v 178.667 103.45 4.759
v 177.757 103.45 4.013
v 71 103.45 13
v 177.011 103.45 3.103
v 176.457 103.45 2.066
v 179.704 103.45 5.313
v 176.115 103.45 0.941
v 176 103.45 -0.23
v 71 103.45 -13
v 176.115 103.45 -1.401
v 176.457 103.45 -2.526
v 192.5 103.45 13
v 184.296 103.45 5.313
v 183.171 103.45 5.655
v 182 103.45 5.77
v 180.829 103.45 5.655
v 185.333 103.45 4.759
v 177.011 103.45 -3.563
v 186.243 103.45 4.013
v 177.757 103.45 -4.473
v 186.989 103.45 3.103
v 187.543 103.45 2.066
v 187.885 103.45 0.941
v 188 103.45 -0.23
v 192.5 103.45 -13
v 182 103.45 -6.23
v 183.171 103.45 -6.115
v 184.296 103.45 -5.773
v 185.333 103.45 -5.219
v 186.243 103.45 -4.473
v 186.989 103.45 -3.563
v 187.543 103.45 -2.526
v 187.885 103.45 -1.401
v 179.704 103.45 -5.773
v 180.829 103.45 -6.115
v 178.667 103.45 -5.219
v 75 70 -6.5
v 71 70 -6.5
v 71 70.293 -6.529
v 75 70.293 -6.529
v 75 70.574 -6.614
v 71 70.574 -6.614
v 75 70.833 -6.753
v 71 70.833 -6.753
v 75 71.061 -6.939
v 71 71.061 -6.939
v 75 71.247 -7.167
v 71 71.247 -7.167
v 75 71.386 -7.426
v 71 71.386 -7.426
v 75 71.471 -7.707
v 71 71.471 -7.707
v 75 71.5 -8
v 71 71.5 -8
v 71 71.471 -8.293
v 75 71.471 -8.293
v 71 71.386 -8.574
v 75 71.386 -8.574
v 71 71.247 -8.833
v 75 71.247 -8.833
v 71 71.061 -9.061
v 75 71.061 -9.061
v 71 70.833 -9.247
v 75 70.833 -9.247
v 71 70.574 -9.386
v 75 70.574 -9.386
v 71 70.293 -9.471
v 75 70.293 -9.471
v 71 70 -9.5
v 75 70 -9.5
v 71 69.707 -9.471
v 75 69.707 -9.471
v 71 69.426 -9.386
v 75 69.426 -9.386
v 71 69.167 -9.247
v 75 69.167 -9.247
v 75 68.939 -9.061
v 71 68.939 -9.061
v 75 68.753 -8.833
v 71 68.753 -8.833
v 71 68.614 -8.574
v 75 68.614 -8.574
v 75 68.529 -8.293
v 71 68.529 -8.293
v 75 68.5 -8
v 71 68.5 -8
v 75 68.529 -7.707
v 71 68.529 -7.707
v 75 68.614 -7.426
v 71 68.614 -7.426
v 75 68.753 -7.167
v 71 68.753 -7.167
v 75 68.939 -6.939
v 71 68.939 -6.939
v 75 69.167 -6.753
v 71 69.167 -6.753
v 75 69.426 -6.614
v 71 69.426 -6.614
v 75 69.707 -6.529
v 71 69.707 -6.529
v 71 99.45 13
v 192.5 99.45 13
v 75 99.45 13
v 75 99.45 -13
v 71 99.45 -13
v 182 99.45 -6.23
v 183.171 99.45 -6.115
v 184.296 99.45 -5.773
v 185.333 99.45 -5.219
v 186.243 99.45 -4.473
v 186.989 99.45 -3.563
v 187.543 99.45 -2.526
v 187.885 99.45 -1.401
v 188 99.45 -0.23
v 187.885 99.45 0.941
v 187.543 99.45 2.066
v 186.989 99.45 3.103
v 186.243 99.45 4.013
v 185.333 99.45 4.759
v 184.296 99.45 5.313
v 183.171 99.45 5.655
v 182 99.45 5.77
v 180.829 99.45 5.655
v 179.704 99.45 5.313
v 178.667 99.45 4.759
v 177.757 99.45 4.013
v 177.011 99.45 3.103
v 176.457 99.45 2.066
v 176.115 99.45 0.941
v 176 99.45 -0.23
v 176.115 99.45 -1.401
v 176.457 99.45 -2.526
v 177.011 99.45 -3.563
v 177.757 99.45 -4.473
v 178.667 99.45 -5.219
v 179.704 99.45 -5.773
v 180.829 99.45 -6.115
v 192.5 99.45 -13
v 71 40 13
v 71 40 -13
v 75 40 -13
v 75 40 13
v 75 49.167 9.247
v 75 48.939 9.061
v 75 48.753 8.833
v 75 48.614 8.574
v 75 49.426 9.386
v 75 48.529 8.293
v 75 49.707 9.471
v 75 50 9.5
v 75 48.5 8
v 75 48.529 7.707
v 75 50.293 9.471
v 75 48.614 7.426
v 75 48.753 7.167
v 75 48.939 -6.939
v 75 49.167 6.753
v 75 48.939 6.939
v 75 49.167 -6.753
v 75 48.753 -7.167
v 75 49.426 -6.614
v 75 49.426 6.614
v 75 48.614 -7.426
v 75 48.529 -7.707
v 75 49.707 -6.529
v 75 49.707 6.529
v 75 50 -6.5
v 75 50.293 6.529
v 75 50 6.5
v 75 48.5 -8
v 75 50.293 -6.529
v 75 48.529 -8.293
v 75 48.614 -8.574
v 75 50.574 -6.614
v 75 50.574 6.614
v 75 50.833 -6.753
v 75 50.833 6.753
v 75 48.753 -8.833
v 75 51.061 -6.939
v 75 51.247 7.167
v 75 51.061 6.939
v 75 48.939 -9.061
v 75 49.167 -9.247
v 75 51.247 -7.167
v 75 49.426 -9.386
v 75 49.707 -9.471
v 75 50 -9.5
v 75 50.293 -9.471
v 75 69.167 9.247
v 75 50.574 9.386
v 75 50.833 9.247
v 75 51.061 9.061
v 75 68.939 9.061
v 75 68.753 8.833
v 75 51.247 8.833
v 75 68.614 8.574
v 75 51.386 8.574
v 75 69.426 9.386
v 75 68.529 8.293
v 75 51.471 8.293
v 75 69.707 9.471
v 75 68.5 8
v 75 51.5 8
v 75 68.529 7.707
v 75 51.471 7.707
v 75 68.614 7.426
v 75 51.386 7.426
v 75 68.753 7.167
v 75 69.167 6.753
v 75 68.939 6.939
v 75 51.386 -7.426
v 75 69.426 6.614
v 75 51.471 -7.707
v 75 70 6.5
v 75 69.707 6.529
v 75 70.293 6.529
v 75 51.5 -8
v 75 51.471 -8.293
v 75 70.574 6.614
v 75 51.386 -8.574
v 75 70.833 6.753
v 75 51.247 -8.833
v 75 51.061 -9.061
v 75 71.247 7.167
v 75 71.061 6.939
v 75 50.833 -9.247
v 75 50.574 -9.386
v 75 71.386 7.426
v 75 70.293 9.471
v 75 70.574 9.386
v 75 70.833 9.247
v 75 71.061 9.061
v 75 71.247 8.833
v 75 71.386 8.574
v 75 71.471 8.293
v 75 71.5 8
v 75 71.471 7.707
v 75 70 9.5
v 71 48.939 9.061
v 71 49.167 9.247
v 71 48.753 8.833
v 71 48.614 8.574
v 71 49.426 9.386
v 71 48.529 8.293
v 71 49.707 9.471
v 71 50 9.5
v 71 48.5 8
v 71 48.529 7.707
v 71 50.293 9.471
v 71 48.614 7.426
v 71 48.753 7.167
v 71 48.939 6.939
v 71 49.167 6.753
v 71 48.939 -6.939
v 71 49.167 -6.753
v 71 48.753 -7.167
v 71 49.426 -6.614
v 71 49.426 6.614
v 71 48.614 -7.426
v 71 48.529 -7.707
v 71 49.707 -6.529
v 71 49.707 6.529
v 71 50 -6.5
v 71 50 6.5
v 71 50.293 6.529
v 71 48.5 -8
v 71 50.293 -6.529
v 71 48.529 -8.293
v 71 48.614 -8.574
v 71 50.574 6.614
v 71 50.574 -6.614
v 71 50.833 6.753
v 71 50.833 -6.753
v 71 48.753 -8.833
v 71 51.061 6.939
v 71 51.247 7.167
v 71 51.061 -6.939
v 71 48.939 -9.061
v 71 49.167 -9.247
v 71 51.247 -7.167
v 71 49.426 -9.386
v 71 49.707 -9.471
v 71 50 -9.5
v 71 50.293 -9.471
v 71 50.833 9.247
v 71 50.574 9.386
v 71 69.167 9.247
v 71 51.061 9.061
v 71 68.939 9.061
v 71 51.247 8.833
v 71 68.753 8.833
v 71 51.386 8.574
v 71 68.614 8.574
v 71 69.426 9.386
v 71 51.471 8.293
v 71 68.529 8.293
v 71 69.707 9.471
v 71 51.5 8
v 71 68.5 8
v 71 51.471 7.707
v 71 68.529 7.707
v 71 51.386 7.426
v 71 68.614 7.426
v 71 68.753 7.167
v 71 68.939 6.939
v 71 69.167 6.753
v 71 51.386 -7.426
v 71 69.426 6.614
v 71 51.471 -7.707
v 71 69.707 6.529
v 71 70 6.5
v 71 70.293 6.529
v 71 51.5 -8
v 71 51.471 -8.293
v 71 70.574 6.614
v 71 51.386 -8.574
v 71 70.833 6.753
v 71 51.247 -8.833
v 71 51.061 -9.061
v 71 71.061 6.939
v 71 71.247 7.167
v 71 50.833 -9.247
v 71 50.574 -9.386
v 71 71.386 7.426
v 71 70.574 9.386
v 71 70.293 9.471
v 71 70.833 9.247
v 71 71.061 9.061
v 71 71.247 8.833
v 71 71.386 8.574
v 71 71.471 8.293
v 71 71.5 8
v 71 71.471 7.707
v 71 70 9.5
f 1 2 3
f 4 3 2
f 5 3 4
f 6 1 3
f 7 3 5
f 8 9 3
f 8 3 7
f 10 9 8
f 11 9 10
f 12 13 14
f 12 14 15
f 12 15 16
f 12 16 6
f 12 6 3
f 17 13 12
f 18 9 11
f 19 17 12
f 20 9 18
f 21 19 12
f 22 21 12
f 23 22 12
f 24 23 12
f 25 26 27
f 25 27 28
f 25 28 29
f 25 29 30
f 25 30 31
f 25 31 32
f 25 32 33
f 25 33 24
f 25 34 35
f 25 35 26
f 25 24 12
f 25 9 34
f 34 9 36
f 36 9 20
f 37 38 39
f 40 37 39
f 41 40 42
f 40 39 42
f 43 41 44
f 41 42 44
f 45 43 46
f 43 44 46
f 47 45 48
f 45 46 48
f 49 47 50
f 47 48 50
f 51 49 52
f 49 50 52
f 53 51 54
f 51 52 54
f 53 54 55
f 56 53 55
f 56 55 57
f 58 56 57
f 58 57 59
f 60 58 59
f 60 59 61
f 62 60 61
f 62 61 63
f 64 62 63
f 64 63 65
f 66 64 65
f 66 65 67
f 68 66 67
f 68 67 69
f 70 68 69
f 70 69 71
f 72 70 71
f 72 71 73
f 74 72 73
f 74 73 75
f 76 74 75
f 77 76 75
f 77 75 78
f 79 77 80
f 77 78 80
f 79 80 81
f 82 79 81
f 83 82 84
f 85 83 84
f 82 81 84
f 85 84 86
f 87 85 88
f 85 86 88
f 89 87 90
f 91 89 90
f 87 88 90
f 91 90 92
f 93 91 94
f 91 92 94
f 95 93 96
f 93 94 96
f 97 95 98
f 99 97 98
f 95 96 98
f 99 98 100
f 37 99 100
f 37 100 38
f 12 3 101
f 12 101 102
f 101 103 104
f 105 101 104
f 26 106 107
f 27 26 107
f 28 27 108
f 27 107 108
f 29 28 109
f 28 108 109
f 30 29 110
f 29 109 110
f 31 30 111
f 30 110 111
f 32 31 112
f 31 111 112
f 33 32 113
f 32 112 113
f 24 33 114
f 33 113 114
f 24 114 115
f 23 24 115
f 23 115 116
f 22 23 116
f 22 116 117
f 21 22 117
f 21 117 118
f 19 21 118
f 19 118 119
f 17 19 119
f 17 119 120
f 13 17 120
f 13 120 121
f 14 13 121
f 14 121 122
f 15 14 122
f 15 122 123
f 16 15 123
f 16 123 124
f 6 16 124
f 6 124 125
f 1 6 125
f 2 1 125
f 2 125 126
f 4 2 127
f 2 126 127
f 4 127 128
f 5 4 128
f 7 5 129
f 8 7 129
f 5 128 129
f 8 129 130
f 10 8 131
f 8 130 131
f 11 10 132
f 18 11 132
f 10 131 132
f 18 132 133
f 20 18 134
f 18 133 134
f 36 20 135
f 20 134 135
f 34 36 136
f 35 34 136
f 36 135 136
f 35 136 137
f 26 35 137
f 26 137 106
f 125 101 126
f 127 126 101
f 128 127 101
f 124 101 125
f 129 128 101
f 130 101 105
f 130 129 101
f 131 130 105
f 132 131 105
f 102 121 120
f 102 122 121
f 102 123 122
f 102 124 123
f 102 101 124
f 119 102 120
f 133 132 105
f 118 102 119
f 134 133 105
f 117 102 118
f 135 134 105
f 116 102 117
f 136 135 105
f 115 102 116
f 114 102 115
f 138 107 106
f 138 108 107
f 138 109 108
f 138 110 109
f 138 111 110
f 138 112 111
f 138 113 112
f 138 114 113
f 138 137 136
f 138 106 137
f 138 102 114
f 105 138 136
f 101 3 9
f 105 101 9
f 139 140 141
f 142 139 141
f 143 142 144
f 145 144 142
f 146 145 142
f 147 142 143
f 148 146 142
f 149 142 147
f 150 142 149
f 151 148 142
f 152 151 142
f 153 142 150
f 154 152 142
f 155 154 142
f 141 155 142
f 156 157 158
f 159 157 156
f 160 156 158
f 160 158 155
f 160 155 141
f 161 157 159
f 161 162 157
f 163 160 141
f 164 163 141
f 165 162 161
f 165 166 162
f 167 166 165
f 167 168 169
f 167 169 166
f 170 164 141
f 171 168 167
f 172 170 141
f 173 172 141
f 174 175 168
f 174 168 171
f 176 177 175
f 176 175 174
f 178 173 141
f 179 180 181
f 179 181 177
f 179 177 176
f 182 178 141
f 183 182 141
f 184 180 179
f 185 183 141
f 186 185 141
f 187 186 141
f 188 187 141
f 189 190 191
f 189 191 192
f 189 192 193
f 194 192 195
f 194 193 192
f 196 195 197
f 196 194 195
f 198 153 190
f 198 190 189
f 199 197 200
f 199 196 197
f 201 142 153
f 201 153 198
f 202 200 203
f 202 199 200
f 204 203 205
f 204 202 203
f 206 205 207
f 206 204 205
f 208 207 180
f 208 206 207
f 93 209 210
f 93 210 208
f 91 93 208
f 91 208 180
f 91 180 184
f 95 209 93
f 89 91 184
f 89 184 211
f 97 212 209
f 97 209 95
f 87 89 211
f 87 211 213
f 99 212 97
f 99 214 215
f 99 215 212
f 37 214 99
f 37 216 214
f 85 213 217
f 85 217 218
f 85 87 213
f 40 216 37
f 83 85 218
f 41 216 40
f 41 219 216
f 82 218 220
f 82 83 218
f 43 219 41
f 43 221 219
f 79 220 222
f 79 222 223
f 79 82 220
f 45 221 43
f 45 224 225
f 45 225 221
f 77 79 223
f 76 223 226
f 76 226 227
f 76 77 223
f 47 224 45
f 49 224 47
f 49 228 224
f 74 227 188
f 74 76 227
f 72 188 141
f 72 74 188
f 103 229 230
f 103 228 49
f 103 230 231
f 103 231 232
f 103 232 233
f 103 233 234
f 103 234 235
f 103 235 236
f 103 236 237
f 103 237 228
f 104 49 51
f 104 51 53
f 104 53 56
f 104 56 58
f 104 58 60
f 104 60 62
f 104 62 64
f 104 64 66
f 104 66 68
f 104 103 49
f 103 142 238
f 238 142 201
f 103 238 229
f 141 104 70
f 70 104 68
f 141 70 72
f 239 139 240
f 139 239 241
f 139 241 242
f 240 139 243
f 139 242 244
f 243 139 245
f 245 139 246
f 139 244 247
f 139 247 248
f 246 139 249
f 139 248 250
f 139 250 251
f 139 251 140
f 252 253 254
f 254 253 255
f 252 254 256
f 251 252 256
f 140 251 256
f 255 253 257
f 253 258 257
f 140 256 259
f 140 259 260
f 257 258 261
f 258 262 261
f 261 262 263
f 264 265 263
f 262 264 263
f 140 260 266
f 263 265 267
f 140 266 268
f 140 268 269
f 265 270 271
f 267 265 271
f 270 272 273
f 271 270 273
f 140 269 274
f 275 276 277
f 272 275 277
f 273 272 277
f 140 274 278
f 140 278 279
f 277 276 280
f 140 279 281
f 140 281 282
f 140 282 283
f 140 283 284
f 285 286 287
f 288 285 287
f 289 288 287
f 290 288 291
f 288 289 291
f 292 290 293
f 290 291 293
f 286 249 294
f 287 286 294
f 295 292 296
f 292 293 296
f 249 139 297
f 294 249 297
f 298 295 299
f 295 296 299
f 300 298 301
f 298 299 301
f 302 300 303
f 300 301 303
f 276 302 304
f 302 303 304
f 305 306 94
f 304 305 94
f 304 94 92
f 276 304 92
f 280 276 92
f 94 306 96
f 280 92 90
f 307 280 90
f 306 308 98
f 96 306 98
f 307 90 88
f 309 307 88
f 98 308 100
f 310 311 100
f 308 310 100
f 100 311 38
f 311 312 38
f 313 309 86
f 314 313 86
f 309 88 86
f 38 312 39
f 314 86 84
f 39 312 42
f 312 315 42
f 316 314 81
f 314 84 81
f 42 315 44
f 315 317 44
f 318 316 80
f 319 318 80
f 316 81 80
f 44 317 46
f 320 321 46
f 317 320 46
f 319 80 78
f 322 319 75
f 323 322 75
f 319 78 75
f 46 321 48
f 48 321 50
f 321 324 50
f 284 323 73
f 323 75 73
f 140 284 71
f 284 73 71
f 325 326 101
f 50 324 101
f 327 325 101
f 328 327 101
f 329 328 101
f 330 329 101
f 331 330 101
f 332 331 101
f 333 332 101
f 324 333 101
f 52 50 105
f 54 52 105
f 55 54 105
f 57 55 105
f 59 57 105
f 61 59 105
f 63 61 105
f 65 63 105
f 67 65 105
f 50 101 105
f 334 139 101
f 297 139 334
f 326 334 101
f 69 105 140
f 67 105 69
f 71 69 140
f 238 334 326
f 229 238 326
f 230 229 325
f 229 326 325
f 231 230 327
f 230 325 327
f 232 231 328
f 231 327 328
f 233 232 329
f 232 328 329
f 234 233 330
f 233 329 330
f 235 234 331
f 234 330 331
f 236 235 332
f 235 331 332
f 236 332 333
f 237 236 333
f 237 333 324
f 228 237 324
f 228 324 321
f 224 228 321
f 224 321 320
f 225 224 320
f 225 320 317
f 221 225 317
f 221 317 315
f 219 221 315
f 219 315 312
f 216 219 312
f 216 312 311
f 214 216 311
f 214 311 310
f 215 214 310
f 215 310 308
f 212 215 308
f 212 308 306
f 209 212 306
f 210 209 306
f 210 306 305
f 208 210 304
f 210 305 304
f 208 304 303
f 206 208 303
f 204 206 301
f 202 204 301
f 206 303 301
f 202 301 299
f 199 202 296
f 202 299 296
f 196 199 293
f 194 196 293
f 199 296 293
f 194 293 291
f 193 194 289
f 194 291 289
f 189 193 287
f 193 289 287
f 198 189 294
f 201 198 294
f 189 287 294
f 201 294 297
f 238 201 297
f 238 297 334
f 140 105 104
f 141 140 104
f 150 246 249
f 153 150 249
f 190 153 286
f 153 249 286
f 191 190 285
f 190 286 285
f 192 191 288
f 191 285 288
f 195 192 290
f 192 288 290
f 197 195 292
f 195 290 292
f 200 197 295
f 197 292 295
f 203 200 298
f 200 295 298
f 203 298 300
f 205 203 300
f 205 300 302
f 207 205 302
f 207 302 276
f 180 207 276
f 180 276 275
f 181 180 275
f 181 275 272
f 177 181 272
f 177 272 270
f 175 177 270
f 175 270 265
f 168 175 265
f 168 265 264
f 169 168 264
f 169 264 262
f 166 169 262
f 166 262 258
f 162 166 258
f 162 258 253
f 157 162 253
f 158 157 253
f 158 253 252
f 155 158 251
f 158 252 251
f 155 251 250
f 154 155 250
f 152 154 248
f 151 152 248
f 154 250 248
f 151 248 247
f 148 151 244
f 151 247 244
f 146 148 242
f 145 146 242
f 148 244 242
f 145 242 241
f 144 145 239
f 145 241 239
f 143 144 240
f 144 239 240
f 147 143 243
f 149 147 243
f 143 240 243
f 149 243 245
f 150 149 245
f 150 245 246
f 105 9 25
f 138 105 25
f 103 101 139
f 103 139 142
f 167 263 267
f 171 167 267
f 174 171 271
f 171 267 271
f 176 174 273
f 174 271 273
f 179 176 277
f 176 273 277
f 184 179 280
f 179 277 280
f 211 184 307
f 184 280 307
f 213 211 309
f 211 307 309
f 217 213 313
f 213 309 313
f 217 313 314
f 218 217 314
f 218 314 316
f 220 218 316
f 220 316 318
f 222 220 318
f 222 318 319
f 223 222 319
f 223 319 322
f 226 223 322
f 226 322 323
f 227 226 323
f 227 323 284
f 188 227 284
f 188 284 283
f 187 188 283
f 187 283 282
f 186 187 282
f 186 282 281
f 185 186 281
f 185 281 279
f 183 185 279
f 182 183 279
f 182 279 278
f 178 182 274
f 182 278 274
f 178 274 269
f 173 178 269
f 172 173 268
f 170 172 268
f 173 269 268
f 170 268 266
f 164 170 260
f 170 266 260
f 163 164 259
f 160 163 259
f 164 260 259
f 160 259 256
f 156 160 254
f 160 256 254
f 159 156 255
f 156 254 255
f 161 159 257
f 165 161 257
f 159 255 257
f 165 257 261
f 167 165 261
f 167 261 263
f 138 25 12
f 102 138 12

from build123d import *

# Parameters (mm, degrees)
SKETCH2_W           = 26
SKETCH2_H           = 4
BOSS_EXTRUDE1_DEPTH = 117.5
CUT_EXTRUDE2_REACH  = 194.98
SKETCH4_R           = 6
SKETCH5_W           = 4
SKETCH5_H           = 26
BOSS_EXTRUDE2_DEPTH = 63.45
CUT_EXTRUDE3_REACH  = 162.104
SKETCH6_R           = 1.5


with BuildPart() as part:
    # Sketch2 → Boss-Extrude1 (new body)
    with BuildSketch(Plane.ZY.offset(-75)):
        with Locations((0, 101.45)):
            Rectangle(SKETCH2_W, SKETCH2_H)
    extrude(amount=-BOSS_EXTRUDE1_DEPTH)

    # Sketch4 → Cut-Extrude2 (cut, up to next)
    with BuildSketch(Plane.XZ.offset(-99.45), mode=Mode.PRIVATE) as cut_extrude2_sk1:
        with Locations(Location((182, -0.23, 0), (0, 0, 270))):
            Circle(SKETCH4_R)
    cut_extrude2_tool1 = extrude(cut_extrude2_sk1.sketch, amount=-CUT_EXTRUDE2_REACH, mode=Mode.PRIVATE) & part.part
    add(cut_extrude2_tool1.solids().sort_by_distance((182, 99.45, -0.23))[0], mode=Mode.SUBTRACT)

    # Sketch5 → Boss-Extrude2 (add)
    with BuildSketch(Plane(origin=(0, 103.45, 0), x_dir=(1, 0, 0), z_dir=(0, 1, 0))):
        with Locations((73, 0)):
            Rectangle(SKETCH5_W, SKETCH5_H)
    extrude(amount=-BOSS_EXTRUDE2_DEPTH)

    # Sketch6 → Cut-Extrude3 (cut, up to next)
    with BuildSketch(Plane.ZY.offset(-71), mode=Mode.PRIVATE) as cut_extrude3_sk1:
        with Locations((-8, 70)):
            Circle(SKETCH6_R)
    cut_extrude3_tool1 = extrude(cut_extrude3_sk1.sketch, amount=-CUT_EXTRUDE3_REACH, mode=Mode.PRIVATE) & part.part
    # Sketch6 → Cut-Extrude3 (cut, up to next)
    with BuildSketch(Plane.ZY.offset(-71), mode=Mode.PRIVATE) as cut_extrude3_sk2:
        with Locations((8, 70)):
            Circle(SKETCH6_R)
    cut_extrude3_tool2 = extrude(cut_extrude3_sk2.sketch, amount=-CUT_EXTRUDE3_REACH, mode=Mode.PRIVATE) & part.part
    # Sketch6 → Cut-Extrude3 (cut, up to next)
    with BuildSketch(Plane.ZY.offset(-71), mode=Mode.PRIVATE) as cut_extrude3_sk3:
        with Locations((-8, 50)):
            Circle(SKETCH6_R)
    cut_extrude3_tool3 = extrude(cut_extrude3_sk3.sketch, amount=-CUT_EXTRUDE3_REACH, mode=Mode.PRIVATE) & part.part
    # Sketch6 → Cut-Extrude3 (cut, up to next)
    with BuildSketch(Plane.ZY.offset(-71), mode=Mode.PRIVATE) as cut_extrude3_sk4:
        with Locations((8, 50)):
            Circle(SKETCH6_R)
    cut_extrude3_tool4 = extrude(cut_extrude3_sk4.sketch, amount=-CUT_EXTRUDE3_REACH, mode=Mode.PRIVATE) & part.part
    add(cut_extrude3_tool1.solids().sort_by_distance((71, 70, -8))[0], mode=Mode.SUBTRACT)
    add(cut_extrude3_tool2.solids().sort_by_distance((71, 70, 8))[0], mode=Mode.SUBTRACT)
    add(cut_extrude3_tool3.solids().sort_by_distance((71, 50, -8))[0], mode=Mode.SUBTRACT)
    add(cut_extrude3_tool4.solids().sort_by_distance((71, 50, 8))[0], mode=Mode.SUBTRACT)


with BuildPart() as body_2:
    # Split1: the piece on the far side of the plane
    add(part.part)
    split(bisect_by=Plane(origin=(0, 99.45, 0), x_dir=(0, 0, -1), z_dir=(0, -1, 0)), keep=Keep.BOTTOM)


with BuildPart() as part_1:
    add(part.part)

    # Split1
    split(bisect_by=Plane(origin=(0, 99.45, 0), x_dir=(0, 0, -1), z_dir=(0, -1, 0)), keep=Keep.TOP)


solid = Compound([body_2.part, part_1.part])
